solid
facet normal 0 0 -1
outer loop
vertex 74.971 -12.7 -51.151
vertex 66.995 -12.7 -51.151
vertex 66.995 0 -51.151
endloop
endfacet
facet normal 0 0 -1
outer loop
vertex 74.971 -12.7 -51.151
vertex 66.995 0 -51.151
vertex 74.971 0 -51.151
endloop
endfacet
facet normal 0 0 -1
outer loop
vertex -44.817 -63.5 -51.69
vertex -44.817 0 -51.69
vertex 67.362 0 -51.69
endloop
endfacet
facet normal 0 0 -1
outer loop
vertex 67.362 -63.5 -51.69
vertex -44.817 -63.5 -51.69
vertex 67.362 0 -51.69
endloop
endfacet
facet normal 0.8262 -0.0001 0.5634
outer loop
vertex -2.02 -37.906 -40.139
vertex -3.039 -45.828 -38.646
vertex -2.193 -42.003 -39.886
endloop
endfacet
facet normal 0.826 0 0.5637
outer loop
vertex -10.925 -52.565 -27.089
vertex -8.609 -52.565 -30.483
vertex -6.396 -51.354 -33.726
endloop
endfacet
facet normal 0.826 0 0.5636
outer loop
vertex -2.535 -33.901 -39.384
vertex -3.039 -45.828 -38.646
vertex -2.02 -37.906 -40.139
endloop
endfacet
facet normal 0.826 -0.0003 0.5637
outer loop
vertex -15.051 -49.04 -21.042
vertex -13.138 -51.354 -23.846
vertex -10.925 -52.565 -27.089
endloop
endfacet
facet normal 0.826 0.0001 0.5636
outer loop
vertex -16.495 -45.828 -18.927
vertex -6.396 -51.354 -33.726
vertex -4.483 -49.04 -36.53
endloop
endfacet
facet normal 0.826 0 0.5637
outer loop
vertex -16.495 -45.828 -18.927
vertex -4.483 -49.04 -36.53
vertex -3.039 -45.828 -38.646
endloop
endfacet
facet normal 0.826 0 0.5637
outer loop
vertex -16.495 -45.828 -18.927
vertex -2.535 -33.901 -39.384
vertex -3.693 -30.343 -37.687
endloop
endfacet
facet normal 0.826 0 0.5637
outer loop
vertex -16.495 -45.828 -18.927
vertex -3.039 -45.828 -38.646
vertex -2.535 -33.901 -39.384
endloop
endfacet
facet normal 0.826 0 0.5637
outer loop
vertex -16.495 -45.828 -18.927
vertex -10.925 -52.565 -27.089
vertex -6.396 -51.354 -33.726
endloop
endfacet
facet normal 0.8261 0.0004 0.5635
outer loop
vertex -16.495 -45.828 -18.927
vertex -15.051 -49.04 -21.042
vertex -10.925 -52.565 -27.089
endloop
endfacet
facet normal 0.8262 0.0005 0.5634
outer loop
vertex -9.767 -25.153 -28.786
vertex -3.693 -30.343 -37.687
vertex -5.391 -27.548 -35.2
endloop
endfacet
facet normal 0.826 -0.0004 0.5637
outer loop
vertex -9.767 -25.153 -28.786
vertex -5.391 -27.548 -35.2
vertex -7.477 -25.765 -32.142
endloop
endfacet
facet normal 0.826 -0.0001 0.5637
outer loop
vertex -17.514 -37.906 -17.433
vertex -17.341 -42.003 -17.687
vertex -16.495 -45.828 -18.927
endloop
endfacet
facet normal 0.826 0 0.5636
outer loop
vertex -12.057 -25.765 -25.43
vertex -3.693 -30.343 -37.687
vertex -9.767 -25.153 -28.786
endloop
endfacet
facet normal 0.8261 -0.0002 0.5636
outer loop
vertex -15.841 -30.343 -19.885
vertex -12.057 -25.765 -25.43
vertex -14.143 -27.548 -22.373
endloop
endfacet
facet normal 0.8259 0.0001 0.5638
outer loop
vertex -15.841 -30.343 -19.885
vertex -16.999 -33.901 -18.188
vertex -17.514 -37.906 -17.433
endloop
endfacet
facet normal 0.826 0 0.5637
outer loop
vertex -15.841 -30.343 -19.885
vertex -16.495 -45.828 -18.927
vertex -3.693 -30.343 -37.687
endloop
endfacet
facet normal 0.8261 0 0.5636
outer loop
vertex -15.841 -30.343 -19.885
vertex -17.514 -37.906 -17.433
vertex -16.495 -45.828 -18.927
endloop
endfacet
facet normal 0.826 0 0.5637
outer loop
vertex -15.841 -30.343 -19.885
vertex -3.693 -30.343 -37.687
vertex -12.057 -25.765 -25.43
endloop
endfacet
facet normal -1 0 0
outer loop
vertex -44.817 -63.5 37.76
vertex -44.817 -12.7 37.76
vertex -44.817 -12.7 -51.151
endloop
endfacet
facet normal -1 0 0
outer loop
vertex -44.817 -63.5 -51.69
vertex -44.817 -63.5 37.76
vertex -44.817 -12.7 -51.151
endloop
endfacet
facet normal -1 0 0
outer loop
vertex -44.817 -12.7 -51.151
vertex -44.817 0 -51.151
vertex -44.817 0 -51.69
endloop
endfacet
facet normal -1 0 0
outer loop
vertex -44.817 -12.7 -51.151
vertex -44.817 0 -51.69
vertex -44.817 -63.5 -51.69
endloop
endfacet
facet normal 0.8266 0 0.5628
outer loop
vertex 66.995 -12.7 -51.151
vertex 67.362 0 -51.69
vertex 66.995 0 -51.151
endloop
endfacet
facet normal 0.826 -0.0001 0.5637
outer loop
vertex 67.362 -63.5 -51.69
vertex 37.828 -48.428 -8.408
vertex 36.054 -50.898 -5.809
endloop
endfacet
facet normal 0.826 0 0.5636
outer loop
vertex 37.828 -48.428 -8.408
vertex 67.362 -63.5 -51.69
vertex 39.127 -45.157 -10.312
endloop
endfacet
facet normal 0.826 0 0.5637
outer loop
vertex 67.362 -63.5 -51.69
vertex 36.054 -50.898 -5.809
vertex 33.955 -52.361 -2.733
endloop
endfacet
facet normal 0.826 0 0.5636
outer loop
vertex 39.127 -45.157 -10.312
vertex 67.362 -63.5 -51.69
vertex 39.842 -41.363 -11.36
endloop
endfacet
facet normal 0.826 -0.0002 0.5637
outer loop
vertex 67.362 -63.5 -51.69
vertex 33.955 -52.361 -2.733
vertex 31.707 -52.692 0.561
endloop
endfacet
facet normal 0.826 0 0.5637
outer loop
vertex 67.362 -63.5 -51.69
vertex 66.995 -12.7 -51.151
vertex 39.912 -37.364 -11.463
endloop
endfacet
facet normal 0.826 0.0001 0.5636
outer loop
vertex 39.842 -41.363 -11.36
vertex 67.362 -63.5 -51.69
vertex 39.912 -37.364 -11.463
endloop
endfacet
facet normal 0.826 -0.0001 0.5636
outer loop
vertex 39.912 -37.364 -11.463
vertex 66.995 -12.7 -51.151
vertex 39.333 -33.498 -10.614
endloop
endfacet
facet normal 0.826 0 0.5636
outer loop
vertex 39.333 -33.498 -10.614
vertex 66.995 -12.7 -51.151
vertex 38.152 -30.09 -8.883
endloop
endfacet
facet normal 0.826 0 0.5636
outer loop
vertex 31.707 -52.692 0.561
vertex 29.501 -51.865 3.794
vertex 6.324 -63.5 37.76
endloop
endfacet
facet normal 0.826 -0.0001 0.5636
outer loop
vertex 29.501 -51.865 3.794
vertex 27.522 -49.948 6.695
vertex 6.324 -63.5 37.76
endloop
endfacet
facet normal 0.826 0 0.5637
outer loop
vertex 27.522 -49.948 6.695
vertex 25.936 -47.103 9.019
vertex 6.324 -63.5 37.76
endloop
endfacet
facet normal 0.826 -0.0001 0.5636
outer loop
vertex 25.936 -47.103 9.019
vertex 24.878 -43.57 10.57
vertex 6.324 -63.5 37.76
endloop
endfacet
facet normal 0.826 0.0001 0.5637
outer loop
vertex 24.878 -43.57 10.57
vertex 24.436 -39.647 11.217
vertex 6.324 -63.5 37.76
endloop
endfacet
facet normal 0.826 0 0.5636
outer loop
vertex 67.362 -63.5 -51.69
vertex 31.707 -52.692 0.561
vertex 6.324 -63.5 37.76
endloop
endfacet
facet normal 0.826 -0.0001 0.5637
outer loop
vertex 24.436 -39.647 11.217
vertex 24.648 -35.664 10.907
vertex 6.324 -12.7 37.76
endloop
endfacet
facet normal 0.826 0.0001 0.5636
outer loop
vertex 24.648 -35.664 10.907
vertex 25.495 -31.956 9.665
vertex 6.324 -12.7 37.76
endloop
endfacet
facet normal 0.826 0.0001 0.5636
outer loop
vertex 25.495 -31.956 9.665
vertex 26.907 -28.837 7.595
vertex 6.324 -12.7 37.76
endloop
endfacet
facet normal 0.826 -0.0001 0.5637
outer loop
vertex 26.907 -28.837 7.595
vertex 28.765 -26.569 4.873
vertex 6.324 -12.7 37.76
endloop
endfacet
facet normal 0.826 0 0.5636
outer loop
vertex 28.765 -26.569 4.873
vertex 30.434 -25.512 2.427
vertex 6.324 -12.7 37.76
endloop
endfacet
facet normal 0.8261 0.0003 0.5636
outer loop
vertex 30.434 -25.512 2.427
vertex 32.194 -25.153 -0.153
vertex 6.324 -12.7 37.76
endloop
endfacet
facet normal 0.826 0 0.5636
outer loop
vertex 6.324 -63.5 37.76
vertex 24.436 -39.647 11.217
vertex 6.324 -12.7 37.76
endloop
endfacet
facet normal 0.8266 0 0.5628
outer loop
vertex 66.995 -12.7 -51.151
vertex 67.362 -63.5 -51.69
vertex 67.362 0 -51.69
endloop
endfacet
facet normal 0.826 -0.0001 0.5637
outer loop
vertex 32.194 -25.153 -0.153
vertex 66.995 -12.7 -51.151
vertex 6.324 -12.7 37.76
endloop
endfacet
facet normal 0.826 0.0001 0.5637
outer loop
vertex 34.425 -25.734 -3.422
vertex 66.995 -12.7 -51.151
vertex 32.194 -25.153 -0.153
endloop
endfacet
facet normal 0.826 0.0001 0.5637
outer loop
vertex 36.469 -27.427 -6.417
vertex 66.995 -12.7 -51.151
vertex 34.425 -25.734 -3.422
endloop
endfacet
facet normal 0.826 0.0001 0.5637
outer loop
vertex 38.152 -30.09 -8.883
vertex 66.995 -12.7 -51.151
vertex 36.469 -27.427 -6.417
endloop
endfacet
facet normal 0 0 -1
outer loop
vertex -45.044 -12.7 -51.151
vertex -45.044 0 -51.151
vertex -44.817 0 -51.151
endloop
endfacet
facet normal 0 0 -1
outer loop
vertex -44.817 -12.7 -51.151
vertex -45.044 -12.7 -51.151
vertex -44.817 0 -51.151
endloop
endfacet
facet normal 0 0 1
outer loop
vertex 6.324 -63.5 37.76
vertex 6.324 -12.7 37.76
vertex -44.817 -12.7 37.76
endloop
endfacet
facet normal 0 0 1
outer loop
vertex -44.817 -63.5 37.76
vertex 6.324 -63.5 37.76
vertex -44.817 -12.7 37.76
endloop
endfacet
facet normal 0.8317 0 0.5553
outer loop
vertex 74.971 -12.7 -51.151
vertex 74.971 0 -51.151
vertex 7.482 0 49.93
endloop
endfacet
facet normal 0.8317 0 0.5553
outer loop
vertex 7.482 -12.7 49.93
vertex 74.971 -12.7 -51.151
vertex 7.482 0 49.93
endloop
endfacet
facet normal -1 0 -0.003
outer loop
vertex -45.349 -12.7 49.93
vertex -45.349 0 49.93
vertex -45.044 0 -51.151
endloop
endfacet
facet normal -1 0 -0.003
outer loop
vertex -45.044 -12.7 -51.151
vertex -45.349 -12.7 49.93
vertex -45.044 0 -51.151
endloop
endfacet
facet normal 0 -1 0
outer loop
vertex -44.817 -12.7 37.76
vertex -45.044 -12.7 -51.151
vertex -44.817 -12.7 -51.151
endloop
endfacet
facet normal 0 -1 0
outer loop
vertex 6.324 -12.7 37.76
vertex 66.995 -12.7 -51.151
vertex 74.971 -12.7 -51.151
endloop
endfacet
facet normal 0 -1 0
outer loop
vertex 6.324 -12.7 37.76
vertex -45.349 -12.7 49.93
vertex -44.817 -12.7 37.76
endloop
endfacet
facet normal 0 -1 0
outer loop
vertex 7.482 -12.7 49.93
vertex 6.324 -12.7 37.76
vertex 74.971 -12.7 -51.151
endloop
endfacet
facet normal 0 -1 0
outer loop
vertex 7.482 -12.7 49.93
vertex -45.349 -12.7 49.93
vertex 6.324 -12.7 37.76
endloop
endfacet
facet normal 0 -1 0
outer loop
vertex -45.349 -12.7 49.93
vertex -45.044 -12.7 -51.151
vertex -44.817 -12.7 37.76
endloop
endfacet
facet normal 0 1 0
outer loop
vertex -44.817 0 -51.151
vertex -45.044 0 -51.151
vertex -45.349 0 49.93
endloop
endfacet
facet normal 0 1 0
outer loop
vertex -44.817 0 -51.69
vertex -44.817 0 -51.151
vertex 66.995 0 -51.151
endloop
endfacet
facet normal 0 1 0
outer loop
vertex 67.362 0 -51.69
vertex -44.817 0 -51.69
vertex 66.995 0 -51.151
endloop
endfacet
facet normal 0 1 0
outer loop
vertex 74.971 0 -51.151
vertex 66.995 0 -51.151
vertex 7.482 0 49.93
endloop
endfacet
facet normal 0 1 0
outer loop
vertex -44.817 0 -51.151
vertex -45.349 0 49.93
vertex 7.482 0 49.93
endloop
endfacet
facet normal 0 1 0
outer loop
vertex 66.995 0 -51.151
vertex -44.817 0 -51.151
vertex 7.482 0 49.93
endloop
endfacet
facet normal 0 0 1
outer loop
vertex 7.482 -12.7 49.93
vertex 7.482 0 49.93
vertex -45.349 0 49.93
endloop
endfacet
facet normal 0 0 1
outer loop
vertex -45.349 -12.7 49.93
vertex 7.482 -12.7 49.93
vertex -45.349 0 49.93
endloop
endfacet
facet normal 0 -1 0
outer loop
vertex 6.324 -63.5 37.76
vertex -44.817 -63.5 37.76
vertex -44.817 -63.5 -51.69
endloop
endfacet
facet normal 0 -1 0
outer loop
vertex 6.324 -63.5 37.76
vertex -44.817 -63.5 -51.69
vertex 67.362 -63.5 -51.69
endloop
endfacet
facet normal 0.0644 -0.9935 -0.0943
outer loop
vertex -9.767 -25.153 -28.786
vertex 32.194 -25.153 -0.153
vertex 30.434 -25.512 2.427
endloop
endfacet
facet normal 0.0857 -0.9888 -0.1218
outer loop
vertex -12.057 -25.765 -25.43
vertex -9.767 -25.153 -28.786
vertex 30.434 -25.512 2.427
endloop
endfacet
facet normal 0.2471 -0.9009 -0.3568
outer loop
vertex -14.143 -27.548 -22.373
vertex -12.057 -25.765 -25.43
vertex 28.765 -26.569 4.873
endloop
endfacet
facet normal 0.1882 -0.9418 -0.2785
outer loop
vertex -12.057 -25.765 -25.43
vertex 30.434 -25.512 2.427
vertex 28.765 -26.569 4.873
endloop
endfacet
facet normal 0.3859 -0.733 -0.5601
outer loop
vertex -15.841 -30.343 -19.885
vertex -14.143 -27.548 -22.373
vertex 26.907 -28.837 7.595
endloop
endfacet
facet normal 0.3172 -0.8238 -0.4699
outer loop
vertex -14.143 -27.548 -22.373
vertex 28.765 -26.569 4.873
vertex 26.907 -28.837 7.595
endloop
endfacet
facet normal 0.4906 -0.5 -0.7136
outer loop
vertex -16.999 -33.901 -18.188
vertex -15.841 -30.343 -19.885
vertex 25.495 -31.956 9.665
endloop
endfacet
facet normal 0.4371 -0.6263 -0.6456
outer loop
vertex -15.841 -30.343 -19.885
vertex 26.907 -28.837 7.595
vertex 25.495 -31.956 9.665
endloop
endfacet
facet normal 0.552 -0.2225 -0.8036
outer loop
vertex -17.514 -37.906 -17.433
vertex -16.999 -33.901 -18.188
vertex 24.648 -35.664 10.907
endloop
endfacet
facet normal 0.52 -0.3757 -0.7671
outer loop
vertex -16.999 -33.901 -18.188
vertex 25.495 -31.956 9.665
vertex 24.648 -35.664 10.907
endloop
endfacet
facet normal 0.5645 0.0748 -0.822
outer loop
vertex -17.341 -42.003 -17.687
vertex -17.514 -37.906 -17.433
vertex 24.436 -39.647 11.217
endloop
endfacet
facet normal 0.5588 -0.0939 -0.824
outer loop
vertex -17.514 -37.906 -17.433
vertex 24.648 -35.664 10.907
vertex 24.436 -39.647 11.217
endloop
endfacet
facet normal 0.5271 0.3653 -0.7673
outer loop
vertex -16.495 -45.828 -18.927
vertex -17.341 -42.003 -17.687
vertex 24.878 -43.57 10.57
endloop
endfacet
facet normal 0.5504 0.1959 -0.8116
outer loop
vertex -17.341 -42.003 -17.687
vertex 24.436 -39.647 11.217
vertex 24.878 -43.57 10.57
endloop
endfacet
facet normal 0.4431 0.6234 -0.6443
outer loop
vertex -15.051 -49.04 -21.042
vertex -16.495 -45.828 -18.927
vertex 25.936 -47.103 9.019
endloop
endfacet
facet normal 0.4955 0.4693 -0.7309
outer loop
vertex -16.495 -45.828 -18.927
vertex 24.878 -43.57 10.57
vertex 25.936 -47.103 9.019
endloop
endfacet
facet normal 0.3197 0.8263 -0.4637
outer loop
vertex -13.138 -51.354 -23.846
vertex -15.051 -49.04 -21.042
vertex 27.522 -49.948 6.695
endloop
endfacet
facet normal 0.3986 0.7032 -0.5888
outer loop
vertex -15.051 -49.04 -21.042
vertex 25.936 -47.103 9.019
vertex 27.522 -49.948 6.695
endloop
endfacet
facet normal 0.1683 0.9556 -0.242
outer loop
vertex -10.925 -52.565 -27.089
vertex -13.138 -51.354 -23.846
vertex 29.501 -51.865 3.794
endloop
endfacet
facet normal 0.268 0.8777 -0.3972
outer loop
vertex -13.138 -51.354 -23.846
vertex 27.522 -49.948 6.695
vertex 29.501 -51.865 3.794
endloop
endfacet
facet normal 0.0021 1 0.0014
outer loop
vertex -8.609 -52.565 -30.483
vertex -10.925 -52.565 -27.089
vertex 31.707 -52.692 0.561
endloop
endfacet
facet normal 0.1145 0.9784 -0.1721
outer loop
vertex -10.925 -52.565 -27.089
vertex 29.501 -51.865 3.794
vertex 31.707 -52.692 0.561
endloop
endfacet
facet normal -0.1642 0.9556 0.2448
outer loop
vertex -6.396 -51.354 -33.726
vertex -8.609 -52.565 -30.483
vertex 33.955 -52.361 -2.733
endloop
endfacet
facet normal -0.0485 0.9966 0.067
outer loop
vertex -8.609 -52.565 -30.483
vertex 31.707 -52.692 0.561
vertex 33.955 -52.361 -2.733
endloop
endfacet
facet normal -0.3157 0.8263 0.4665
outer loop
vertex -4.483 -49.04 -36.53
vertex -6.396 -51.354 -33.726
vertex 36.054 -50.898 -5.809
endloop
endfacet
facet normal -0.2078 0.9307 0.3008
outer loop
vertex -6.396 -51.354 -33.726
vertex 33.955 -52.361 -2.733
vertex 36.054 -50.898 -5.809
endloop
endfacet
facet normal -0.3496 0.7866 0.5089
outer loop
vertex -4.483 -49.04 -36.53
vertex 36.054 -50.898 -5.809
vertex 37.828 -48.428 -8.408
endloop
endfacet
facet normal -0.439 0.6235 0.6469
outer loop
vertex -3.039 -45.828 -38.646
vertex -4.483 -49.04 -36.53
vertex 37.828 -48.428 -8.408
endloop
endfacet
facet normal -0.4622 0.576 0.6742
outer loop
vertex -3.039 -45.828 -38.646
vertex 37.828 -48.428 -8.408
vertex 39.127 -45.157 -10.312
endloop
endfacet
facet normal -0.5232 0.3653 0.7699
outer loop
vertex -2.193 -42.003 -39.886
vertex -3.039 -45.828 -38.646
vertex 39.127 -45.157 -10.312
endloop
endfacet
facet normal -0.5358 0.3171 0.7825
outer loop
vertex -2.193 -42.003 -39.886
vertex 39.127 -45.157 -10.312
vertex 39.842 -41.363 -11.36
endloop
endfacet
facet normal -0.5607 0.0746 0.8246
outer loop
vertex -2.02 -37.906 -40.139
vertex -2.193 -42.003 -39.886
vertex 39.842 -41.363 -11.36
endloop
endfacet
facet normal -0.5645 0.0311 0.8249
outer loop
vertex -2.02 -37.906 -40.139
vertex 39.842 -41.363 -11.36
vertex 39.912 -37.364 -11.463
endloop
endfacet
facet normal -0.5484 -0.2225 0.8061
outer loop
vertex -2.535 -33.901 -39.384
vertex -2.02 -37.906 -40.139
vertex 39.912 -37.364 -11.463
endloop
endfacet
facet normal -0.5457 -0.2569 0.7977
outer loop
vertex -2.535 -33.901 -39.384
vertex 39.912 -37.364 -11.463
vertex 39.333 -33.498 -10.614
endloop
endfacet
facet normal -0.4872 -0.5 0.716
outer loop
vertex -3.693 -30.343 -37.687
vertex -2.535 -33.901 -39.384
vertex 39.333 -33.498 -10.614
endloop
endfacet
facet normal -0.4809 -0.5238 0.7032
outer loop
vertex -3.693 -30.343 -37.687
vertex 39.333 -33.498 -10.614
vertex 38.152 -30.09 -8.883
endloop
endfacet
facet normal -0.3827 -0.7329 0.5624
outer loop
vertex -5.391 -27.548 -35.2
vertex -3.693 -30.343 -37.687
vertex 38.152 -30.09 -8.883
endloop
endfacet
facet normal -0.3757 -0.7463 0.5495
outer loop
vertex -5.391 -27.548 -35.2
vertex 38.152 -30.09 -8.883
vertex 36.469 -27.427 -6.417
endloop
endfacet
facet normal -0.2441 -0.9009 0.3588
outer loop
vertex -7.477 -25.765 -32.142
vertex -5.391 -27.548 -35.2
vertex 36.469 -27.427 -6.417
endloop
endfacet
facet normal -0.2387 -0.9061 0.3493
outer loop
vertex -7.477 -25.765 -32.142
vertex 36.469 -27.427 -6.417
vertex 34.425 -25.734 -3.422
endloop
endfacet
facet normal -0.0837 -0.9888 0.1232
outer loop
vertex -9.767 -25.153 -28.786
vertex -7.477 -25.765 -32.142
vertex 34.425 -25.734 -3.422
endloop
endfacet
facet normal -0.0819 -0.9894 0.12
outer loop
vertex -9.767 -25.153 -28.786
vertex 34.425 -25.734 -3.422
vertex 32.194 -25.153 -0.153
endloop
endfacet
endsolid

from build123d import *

# Parameters (mm, degrees)
F1_DEPTH = 63.5
F3_DEPTH = 12.7
F4_R     = 13.783104
F5_DEPTH = 50.8


with BuildPart() as f1:
    # F0 (on Front) → F1 (new body)
    with BuildSketch(Plane.XZ):
        Polygon((6.323813, 37.759591), (-44.816598, 37.759591), (-44.816598, -51.69031), (67.362368, -51.69031), align=None)
    extrude(amount=F1_DEPTH)

    # F2 (on Front) → F3 (join)
    with BuildSketch(Plane.XZ):
        Polygon((-45.349181, 49.929906), (-45.0438, -51.151432), (74.971199, -51.151432), (7.481851, 49.929906), align=None)
    extrude(amount=F3_DEPTH)

    # F4 (on face) → F5 (cut)
    with BuildSketch(Plane(origin=(21.894957, 0, 14.940615), x_dir=(0, 1, 0), z_dir=(0.826012, 0, 0.563652))):
        with Locations((-38.936164, -18.272493)):
            Circle(F4_R)
    extrude(amount=-F5_DEPTH, mode=Mode.SUBTRACT)


solid = f1.part
